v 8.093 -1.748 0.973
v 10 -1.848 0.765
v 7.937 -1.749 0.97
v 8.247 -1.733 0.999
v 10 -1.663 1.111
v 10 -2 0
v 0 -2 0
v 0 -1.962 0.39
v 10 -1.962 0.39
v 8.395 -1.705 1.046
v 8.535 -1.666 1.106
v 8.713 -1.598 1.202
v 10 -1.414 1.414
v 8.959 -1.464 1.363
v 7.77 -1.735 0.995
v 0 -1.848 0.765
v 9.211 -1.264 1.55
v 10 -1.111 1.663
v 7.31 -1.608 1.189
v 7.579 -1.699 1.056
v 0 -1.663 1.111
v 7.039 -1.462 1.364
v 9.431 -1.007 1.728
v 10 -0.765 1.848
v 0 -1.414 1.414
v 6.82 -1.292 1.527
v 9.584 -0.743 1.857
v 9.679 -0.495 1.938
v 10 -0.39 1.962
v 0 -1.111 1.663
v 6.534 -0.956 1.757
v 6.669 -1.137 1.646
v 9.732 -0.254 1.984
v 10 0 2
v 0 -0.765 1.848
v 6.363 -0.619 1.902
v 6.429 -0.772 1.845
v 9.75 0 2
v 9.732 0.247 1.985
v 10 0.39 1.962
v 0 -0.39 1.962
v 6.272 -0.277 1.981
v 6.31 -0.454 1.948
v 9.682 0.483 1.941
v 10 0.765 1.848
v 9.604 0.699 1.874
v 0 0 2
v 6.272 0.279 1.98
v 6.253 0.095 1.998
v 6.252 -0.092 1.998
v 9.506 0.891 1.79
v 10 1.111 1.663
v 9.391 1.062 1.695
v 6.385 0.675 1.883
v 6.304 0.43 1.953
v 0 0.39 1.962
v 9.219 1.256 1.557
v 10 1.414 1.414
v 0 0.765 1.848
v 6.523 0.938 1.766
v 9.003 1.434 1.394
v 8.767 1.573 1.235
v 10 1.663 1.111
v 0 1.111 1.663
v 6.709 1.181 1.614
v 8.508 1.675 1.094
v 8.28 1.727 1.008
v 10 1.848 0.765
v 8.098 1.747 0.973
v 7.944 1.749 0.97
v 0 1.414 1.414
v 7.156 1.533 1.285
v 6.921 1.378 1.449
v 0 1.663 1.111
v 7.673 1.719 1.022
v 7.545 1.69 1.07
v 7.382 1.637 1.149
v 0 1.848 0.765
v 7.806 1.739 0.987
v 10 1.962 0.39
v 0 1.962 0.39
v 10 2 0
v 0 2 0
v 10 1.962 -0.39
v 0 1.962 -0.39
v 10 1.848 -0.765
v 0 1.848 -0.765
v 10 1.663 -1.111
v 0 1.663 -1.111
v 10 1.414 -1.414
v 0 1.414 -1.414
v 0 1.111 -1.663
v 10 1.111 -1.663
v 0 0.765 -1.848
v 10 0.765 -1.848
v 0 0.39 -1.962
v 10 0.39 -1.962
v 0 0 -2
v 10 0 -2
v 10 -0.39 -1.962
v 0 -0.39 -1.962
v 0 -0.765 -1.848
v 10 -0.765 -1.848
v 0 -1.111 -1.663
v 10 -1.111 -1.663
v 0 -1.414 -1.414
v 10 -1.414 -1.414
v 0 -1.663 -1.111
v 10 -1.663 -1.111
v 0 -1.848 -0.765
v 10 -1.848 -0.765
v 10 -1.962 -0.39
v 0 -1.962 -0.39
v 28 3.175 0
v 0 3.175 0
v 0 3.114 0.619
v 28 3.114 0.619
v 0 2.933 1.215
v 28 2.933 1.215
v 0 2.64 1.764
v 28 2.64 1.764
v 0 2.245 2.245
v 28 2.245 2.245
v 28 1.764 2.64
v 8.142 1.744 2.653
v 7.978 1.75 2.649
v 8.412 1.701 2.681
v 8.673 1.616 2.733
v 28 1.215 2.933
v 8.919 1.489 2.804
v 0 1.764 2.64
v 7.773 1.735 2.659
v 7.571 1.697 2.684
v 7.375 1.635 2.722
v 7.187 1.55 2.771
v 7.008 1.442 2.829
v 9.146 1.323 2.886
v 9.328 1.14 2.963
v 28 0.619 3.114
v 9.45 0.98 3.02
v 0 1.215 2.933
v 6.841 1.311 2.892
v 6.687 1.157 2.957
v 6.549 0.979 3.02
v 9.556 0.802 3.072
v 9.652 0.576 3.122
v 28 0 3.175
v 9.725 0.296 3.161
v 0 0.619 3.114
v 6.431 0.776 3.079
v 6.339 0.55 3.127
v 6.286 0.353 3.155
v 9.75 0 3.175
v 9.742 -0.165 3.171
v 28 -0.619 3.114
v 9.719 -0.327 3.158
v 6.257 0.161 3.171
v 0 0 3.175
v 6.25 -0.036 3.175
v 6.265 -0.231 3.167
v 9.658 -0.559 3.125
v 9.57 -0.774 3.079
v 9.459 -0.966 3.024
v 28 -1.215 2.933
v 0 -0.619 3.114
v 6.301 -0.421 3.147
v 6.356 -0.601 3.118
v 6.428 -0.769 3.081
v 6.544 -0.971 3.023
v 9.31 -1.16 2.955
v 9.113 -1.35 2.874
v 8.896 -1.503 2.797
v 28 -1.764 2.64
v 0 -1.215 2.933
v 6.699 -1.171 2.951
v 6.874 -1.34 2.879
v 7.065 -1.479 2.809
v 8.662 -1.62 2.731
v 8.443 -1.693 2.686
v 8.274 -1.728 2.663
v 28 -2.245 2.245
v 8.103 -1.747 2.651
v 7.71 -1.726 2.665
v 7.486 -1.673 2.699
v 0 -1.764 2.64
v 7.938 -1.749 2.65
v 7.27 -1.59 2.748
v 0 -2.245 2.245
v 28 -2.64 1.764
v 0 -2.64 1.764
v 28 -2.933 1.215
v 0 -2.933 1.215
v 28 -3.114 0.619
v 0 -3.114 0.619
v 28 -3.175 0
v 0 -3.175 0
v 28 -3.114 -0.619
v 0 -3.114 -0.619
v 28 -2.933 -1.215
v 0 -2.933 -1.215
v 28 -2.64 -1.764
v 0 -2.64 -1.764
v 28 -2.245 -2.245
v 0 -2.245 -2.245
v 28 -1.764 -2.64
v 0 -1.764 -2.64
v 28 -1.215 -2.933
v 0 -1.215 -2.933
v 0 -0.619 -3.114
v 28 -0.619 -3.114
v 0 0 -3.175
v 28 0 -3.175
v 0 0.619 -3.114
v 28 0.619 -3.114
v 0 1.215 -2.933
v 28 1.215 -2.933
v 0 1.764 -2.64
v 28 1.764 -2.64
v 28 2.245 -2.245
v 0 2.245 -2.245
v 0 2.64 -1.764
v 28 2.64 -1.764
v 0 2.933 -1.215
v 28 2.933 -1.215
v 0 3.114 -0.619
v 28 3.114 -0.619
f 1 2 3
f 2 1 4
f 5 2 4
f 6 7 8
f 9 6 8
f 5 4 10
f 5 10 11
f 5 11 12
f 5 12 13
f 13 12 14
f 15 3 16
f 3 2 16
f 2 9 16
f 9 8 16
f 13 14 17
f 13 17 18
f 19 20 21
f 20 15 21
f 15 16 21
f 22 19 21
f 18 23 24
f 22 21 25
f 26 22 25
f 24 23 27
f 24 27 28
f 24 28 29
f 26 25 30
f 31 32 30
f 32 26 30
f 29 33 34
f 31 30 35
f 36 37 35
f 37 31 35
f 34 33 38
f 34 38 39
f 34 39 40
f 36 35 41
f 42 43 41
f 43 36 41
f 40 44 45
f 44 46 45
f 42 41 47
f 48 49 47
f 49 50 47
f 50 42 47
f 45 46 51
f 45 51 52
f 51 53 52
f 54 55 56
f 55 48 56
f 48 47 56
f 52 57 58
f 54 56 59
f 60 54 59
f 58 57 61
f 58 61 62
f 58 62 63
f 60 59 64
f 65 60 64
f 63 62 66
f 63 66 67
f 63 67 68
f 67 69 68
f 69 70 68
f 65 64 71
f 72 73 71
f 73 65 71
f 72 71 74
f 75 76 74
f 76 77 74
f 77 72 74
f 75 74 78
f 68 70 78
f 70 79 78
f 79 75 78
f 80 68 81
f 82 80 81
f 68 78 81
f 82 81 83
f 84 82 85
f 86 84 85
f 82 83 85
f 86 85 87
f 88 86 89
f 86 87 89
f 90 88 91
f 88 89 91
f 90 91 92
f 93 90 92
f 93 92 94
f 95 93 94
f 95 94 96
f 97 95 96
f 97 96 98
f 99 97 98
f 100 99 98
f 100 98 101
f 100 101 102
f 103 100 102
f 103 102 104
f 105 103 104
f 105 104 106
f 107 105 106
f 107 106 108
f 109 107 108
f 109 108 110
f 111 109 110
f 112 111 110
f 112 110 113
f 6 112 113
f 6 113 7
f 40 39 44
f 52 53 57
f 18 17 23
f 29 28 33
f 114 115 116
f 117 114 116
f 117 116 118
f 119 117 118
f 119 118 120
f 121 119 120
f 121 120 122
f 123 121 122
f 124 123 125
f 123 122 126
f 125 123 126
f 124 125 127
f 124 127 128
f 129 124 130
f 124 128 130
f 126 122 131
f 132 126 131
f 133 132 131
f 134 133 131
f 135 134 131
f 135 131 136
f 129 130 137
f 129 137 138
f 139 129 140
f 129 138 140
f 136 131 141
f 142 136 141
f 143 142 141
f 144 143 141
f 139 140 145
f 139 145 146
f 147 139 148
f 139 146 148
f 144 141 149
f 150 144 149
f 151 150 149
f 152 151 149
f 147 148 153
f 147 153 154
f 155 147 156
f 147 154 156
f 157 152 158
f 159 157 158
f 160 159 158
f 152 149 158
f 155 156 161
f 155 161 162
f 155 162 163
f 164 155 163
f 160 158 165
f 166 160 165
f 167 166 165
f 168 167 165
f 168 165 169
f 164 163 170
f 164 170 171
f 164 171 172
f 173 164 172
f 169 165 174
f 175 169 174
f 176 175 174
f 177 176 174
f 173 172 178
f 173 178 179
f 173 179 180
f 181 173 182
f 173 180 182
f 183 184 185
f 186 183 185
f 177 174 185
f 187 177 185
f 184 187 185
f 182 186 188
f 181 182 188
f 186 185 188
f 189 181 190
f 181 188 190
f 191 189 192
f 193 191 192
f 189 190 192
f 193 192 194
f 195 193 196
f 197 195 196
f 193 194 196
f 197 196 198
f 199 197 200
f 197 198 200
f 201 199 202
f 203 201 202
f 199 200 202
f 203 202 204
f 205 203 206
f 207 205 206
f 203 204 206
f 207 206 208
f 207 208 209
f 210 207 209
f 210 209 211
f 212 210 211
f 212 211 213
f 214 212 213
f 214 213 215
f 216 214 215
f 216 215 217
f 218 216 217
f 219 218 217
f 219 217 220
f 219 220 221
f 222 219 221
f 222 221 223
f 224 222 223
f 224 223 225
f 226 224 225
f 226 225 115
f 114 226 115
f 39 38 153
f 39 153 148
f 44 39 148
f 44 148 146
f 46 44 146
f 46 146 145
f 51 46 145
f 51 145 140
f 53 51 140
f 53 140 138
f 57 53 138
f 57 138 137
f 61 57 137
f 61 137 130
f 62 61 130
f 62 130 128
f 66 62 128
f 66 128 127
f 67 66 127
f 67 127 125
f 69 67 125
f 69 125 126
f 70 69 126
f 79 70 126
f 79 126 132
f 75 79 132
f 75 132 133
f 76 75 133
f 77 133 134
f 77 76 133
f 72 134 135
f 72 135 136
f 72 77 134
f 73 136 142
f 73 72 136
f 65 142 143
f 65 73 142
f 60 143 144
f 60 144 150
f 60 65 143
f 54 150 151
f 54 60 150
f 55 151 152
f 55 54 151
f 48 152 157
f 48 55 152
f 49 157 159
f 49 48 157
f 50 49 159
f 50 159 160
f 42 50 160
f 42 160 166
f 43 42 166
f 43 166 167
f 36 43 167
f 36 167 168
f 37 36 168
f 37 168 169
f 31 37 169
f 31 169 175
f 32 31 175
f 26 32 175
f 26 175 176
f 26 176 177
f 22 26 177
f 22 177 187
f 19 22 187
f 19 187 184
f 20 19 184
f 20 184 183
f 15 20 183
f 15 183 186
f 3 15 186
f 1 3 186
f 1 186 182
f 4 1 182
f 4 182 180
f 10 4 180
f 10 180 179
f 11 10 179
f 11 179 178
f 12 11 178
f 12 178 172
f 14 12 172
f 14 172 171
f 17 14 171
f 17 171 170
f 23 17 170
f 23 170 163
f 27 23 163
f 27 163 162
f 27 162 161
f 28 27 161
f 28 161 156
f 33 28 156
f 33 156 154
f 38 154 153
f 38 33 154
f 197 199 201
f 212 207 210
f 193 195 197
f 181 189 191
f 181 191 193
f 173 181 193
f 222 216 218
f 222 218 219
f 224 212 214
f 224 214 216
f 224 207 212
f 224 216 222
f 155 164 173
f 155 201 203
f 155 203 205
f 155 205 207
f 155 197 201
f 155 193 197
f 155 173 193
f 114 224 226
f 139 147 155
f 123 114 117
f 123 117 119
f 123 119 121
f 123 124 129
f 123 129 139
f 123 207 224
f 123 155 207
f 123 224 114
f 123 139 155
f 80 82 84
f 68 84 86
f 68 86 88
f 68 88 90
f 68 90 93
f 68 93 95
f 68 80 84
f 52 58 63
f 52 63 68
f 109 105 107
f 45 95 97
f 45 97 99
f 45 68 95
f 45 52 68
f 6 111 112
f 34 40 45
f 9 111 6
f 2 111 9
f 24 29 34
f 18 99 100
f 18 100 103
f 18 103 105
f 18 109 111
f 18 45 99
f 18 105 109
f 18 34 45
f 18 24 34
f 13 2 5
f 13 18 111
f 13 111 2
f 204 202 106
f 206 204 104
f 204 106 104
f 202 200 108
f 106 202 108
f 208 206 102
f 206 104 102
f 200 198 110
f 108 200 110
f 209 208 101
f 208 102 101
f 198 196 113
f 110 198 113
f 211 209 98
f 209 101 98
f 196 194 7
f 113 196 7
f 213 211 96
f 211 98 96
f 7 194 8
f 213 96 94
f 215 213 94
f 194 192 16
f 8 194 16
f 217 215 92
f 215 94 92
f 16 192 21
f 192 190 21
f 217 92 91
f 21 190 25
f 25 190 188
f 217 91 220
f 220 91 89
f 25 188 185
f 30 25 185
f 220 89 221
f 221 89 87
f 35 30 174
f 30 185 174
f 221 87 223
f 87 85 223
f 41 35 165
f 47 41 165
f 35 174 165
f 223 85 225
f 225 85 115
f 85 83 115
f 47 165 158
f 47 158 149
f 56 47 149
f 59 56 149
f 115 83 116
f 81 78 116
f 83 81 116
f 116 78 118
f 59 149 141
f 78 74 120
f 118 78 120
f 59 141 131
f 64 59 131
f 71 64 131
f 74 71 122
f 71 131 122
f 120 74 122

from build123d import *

# Parameters (mm, degrees)
F0_R     = 3.175
F1_DEPTH = 28
F2_R     = 2
F3_DEPTH = 10
F4_R     = 1.75
F5_DEPTH = 3.176


with BuildPart() as f1:
    # F0 (on Right) → F1 (new body)
    with BuildSketch(Plane.YZ):
        Circle(F0_R)
    extrude(amount=F1_DEPTH)

    # F2 (on face) → F3 (cut)
    with BuildSketch(Plane(origin=(0, 0, 0), x_dir=(0, -1, 0), z_dir=(-1, 0, 0))):
        Circle(F2_R)
    extrude(amount=-F3_DEPTH, mode=Mode.SUBTRACT)

    # F4 (on Top) → F5 (cut, through all)
    with BuildSketch(Plane.XY):
        with Locations((8, 0)):
            Circle(F4_R)
    extrude(amount=F5_DEPTH, mode=Mode.SUBTRACT)


solid = f1.part
